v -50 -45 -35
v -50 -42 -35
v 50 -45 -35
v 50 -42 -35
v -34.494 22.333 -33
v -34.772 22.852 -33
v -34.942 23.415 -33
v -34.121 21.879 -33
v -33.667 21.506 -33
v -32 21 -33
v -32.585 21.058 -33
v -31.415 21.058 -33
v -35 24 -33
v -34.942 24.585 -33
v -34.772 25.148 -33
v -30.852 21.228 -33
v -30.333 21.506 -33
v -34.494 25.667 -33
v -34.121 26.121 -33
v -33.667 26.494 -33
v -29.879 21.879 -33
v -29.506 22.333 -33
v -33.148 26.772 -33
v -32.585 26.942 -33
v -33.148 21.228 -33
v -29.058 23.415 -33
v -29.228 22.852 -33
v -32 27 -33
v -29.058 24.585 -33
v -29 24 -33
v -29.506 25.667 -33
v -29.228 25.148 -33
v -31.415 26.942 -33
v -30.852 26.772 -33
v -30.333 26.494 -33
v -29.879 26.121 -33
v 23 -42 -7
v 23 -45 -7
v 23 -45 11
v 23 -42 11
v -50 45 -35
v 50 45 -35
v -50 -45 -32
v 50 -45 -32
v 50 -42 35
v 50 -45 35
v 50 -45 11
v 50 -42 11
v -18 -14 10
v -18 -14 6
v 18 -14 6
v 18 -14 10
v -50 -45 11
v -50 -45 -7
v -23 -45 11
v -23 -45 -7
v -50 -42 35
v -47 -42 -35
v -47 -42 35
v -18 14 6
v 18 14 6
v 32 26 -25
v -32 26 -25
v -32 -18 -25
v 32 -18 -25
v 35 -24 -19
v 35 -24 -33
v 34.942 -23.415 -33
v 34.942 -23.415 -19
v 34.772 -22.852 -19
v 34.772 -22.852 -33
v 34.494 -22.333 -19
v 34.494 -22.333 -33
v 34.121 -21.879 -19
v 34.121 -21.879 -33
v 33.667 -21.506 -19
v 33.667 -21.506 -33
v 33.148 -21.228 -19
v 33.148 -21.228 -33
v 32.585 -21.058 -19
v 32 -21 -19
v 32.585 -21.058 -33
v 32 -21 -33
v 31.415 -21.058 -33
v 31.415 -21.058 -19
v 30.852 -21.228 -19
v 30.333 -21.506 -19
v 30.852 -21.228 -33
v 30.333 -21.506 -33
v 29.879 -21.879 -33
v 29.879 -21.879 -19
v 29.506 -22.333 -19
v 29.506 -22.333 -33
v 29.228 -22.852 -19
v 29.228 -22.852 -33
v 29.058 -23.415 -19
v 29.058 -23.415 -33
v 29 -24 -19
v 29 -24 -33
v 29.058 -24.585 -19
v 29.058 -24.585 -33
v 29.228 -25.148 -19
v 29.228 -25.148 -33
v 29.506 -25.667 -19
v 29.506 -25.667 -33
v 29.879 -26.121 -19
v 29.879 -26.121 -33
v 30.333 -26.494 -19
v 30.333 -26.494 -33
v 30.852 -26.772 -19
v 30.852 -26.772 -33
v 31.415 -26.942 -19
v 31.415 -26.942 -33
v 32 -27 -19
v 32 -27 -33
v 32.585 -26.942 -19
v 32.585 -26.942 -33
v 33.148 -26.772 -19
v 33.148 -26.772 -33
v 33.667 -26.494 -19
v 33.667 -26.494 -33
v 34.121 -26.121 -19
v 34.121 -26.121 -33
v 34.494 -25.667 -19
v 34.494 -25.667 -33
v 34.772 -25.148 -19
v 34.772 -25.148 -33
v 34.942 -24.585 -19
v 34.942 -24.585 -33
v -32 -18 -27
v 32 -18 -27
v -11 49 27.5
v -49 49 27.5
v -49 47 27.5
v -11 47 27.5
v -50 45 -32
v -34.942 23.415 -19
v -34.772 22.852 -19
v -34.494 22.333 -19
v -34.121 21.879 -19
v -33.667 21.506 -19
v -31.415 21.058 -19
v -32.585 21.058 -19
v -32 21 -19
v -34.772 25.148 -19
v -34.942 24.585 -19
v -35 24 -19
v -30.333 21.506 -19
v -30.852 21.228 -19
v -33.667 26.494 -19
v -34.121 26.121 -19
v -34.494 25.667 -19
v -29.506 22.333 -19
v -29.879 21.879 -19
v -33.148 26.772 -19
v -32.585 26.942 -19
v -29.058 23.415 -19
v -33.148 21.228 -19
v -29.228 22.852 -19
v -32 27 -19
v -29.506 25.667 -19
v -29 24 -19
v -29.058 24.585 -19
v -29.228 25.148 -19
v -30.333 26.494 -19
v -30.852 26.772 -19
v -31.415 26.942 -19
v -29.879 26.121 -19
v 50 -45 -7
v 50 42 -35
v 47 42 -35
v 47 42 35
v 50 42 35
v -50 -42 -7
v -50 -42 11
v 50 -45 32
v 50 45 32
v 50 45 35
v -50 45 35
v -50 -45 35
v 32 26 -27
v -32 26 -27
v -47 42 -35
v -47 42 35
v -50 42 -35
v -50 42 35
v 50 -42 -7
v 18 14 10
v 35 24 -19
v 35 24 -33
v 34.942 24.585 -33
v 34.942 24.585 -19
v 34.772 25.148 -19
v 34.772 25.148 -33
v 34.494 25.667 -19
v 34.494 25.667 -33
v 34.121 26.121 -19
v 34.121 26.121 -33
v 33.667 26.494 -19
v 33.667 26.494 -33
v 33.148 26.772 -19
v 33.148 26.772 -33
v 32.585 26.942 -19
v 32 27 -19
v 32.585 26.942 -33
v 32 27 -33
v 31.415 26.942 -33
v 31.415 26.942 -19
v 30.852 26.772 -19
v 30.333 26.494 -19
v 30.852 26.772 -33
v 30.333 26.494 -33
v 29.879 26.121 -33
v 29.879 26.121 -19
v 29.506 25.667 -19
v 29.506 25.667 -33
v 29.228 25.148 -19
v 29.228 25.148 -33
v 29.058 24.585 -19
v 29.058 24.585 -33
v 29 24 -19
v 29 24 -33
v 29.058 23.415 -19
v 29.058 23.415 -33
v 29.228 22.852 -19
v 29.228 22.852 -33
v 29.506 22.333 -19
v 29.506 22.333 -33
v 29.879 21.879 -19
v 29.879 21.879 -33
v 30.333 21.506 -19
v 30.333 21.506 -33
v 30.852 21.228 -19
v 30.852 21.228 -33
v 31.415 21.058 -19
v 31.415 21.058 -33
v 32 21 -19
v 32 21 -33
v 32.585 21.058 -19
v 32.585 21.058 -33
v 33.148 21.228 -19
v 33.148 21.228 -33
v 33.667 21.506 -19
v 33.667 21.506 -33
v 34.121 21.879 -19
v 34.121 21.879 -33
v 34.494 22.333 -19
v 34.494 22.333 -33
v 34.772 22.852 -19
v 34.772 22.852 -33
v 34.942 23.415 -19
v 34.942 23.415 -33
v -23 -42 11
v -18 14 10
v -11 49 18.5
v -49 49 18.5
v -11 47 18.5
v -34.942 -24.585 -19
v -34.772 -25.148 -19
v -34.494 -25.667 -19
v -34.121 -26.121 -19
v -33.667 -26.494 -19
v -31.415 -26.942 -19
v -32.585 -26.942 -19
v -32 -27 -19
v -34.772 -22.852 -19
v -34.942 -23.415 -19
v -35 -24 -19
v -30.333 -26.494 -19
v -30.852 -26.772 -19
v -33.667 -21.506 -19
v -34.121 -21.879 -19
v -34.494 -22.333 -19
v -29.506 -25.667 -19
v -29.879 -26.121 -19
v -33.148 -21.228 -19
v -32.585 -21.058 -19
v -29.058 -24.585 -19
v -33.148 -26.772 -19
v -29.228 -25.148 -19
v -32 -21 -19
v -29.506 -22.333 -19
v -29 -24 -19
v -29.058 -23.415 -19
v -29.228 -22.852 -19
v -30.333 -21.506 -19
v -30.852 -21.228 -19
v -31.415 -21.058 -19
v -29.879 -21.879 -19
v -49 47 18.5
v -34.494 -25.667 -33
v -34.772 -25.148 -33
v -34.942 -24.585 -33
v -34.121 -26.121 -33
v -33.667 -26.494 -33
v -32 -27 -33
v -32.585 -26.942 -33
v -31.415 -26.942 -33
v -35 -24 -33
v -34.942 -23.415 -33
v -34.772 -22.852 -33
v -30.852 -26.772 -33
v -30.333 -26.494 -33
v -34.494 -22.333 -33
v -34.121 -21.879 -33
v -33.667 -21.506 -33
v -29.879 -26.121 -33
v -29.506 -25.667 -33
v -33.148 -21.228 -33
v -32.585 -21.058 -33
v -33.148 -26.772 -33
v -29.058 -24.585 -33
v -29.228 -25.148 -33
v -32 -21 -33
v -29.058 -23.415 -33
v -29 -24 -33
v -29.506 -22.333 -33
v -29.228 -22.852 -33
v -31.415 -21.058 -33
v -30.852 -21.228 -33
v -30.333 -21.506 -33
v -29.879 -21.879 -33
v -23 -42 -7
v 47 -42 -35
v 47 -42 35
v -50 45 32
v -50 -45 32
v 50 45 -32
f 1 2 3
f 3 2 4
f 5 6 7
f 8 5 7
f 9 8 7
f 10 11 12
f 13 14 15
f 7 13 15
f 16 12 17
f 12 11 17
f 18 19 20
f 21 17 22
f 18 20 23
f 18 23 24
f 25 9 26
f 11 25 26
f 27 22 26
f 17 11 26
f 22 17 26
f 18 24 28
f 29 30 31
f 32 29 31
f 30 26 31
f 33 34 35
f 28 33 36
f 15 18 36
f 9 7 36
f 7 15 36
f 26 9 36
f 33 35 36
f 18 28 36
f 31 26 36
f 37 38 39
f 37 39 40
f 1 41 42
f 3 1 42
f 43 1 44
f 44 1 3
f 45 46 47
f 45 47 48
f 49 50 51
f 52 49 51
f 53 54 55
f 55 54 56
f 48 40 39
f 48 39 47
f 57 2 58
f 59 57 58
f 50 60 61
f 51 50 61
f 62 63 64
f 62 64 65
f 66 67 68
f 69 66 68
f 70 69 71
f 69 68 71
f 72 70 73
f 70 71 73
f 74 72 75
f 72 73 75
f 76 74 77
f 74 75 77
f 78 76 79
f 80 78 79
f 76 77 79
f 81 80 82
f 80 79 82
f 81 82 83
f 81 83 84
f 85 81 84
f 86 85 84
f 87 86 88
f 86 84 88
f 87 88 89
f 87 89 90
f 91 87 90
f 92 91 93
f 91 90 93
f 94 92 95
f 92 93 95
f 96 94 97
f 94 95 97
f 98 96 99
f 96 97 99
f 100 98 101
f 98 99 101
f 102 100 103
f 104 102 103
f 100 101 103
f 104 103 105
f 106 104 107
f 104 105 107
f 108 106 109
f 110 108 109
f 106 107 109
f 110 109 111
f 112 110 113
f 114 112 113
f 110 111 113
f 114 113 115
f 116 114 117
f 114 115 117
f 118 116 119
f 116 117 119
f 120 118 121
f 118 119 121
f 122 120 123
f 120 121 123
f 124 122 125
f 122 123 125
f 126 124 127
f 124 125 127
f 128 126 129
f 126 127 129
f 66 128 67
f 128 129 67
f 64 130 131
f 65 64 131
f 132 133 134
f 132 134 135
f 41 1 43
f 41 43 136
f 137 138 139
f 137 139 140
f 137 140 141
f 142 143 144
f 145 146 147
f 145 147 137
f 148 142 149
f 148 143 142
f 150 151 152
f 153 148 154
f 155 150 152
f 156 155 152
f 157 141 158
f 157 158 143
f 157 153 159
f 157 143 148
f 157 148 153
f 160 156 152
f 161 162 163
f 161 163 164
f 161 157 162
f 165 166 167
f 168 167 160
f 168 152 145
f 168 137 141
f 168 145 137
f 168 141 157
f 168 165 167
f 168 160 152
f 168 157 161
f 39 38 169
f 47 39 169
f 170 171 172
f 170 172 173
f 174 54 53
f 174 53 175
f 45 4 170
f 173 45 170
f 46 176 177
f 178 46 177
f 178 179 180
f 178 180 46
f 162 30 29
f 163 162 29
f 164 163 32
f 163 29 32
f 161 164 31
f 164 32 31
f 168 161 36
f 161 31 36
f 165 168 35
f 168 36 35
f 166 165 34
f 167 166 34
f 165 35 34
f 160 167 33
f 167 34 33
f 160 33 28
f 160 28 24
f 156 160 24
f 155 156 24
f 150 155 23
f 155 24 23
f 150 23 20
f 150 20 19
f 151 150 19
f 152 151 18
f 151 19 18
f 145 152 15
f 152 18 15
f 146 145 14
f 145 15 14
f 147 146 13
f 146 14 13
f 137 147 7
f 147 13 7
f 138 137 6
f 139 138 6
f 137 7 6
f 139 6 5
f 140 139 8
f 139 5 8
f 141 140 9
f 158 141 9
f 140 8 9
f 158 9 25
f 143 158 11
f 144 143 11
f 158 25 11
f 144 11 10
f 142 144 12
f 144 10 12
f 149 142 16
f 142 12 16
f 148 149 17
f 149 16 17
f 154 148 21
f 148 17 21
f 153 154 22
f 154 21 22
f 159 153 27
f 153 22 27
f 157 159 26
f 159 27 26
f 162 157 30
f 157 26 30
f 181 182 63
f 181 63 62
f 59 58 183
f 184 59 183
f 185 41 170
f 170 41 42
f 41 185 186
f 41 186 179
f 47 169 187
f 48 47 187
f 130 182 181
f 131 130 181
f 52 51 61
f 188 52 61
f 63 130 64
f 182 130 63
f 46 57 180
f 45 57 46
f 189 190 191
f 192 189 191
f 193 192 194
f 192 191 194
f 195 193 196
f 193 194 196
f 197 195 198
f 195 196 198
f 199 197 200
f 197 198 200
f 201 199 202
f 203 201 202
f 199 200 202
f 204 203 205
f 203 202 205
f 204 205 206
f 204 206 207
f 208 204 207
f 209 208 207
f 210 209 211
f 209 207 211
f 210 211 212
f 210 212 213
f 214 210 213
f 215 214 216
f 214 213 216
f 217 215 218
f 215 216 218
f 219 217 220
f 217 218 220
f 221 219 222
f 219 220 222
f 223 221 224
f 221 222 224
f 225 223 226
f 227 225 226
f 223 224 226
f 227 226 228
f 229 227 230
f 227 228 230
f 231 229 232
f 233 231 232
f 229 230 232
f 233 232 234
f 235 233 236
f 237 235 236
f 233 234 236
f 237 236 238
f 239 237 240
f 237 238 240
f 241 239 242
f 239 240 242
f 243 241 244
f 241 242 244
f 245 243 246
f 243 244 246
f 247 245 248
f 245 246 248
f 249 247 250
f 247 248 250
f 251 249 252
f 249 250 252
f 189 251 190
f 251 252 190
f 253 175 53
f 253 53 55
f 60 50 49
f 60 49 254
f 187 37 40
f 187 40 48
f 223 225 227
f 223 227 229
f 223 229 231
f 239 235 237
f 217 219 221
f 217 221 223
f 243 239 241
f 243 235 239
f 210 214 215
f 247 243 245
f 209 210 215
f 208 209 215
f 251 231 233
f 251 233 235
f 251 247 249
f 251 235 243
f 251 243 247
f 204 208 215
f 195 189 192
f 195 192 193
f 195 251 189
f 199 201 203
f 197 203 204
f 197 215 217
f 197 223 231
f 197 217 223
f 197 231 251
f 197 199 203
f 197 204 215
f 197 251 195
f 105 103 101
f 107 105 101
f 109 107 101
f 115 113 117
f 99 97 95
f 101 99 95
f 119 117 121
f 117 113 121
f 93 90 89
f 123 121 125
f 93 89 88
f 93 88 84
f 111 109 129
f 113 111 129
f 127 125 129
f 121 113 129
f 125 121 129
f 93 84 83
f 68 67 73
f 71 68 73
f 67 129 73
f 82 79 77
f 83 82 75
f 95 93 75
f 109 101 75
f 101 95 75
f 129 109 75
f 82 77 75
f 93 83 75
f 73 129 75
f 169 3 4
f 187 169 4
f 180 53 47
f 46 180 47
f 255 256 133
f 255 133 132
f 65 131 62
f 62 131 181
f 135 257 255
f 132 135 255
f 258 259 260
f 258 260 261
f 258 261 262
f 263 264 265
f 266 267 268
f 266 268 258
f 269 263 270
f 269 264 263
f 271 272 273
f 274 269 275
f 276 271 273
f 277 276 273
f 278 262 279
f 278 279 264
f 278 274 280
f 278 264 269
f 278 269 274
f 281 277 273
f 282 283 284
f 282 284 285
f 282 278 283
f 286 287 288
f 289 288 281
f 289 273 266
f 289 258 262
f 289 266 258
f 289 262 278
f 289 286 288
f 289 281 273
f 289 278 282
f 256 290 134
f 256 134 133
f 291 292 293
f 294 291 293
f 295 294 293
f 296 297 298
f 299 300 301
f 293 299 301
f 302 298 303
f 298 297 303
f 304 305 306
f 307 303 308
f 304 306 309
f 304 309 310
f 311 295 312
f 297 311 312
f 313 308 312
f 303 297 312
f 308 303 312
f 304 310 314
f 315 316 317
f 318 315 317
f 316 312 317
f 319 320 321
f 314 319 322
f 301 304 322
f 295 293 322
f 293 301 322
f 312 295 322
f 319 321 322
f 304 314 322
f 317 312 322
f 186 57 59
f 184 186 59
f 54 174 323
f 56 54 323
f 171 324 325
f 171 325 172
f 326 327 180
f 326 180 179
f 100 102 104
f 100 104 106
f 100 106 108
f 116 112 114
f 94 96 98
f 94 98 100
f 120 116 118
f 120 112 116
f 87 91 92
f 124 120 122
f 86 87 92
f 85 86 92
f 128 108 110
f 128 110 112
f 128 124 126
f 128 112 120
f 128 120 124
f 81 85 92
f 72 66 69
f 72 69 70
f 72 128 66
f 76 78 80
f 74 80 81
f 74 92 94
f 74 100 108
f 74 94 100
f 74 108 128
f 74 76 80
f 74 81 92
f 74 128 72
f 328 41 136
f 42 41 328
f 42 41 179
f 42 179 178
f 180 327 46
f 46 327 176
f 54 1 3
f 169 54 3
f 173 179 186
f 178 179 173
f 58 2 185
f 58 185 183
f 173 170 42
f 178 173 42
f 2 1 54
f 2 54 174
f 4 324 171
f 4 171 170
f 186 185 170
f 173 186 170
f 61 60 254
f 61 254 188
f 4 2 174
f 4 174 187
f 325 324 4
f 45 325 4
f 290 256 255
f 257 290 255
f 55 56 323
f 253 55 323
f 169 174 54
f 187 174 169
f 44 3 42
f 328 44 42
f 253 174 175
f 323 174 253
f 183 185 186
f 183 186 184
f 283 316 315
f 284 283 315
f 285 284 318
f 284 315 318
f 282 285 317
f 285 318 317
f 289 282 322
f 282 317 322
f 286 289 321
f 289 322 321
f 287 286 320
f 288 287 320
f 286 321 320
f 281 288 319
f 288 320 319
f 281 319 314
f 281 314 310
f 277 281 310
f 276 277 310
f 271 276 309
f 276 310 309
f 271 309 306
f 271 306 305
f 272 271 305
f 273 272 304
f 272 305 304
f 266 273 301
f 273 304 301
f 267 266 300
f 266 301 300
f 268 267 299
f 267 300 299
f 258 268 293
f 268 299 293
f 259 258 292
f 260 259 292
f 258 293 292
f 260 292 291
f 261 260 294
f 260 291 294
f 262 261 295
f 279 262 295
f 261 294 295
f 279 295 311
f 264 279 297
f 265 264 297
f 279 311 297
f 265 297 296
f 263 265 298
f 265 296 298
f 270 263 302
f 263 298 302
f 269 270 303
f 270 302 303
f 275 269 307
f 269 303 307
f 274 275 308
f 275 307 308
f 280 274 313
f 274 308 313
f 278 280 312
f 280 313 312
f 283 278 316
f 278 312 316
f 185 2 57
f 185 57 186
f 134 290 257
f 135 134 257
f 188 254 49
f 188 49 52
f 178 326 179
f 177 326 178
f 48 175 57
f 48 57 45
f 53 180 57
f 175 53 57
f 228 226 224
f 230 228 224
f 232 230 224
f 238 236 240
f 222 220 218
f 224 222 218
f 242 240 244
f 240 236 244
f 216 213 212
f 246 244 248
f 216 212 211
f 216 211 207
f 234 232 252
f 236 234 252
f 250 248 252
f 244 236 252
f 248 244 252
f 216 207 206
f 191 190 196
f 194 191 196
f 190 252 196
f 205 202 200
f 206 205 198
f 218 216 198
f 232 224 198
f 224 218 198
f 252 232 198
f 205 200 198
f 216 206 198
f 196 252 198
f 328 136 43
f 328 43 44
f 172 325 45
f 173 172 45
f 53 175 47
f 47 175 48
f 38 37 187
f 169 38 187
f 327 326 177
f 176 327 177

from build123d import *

# Parameters (mm, degrees)
BOTTOM_START                                   = -35
SKETCH_1_W                                     = 100
SKETCH_1_H                                     = 90
BOTTOM_PLATE_100_X_90_X_3_MM_DEPTH             = 3
BACK_START                                     = -35
SKETCH_2_W                                     = 100
SKETCH_2_H                                     = 3
BACK_WALL_3_MM_DEPTH                           = 70
LEFT_START                                     = -35
SKETCH_3_W                                     = 3
SKETCH_3_H                                     = 84
LEFT_SIDE_WALL_3_MM_DEPTH                      = 70
RIGHT_START                                    = -35
SKETCH_4_W                                     = 3
SKETCH_4_H                                     = 84
RIGHT_SIDE_WALL_3_MM_DEPTH                     = 70
FRONT_START                                    = -35
SKETCH_5_W                                     = 100
SKETCH_5_H                                     = 3
FRONT_WALL_LOWER_FRAME_BELOW_HC_SR04_WIN_DEPTH = 28
FRONT_START_2                                  = 11
SKETCH_6_W                                     = 100
SKETCH_6_H                                     = 3
FRONT_WALL_UPPER_FRAME_ABOVE_HC_SR04_WIN_DEPTH = 24
FRONT_START_3                                  = -7
SKETCH_7_W                                     = 27
SKETCH_7_H                                     = 3
FRONT_WALL_LEFT_FRAME_DEPTH                    = 18
SKETCH_8_W                                     = 27
SKETCH_8_H                                     = 3
FRONT_WALL_RIGHT_FRAME_DEPTH                   = 18
TRANSPARENT_START                              = 32
SKETCH_9_W                                     = 100
SKETCH_9_H                                     = 90
TRANSPARENT_TOP_LID_REMOVABLE_DEPTH            = 3
SERVO_START                                    = 6
SKETCH_10_W                                    = 36
SKETCH_10_H                                    = 28
SERVO_SUPPORT_PLATFORM_36_X_28_X_4_MM_DEPTH    = 4
BATTERY_START                                  = -27
SKETCH_11_W                                    = 64
SKETCH_11_H                                    = 44
BATTERY_TRAY_BASE_60_X_40_MM_DEPTH             = 2
PCB_START                                      = -33
SKETCH_12_R                                    = 3
PCB_STANDOFF_1_M3_CLEARANCE_MARKER_DEPTH       = 14
SKETCH_13_R                                    = 3
PCB_STANDOFF_2_M3_CLEARANCE_MARKER_DEPTH       = 14
SKETCH_14_R                                    = 3
PCB_STANDOFF_3_M3_CLEARANCE_MARKER_DEPTH       = 14
SKETCH_15_R                                    = 3
PCB_STANDOFF_4_M3_CLEARANCE_MARKER_DEPTH       = 14
CASE_START                                     = 18.5
SKETCH_16_W                                    = 38
SKETCH_16_H                                    = 2
CASE_LABEL_PLATE_CASE_100X90X70_DEPTH          = 9


with BuildPart() as part:
    # 草图1 → bottom plate - 100 x 90 x 3 mm (new body)
    with BuildSketch(Plane.XY.offset(BOTTOM_START)):
        Rectangle(SKETCH_1_W, SKETCH_1_H)
    extrude(amount=BOTTOM_PLATE_100_X_90_X_3_MM_DEPTH)


with BuildPart() as body_2:
    # 草图2 → back wall - 3 mm (new body)
    with BuildSketch(Plane.XY.offset(BACK_START)):
        with Locations((0, 43.5)):
            Rectangle(SKETCH_2_W, SKETCH_2_H)
    extrude(amount=BACK_WALL_3_MM_DEPTH)


with BuildPart() as body_3:
    # 草图3 → left side wall - 3 mm (new body)
    with BuildSketch(Plane.XY.offset(LEFT_START)):
        with Locations((-48.5, 0)):
            Rectangle(SKETCH_3_W, SKETCH_3_H)
    extrude(amount=LEFT_SIDE_WALL_3_MM_DEPTH)


with BuildPart() as body_4:
    # 草图4 → right side wall - 3 mm (new body)
    with BuildSketch(Plane.XY.offset(RIGHT_START)):
        with Locations((48.5, 0)):
            Rectangle(SKETCH_4_W, SKETCH_4_H)
    extrude(amount=RIGHT_SIDE_WALL_3_MM_DEPTH)


with BuildPart() as body_5:
    # 草图5 → front wall lower frame below HC-SR04 window (new body)
    with BuildSketch(Plane.XY.offset(FRONT_START)):
        with Locations((0, -43.5)):
            Rectangle(SKETCH_5_W, SKETCH_5_H)
    extrude(amount=FRONT_WALL_LOWER_FRAME_BELOW_HC_SR04_WIN_DEPTH)


with BuildPart() as body_6:
    # 草图6 → front wall upper frame above HC-SR04 window (new body)
    with BuildSketch(Plane.XY.offset(FRONT_START_2)):
        with Locations((0, -43.5)):
            Rectangle(SKETCH_6_W, SKETCH_6_H)
    extrude(amount=FRONT_WALL_UPPER_FRAME_ABOVE_HC_SR04_WIN_DEPTH)


with BuildPart() as body_7:
    # 草图7 → front wall left frame (new body)
    with BuildSketch(Plane.XY.offset(FRONT_START_3)):
        with Locations((-36.5, -43.5)):
            Rectangle(SKETCH_7_W, SKETCH_7_H)
    extrude(amount=FRONT_WALL_LEFT_FRAME_DEPTH)


with BuildPart() as body_8:
    # 草图8 → front wall right frame (new body)
    with BuildSketch(Plane.XY.offset(FRONT_START_3)):
        with Locations((36.5, -43.5)):
            Rectangle(SKETCH_8_W, SKETCH_8_H)
    extrude(amount=FRONT_WALL_RIGHT_FRAME_DEPTH)


with BuildPart() as body_9:
    # 草图9 → transparent top lid - removable (new body)
    with BuildSketch(Plane.XY.offset(TRANSPARENT_START)):
        Rectangle(SKETCH_9_W, SKETCH_9_H)
    extrude(amount=TRANSPARENT_TOP_LID_REMOVABLE_DEPTH)


with BuildPart() as body_10:
    # 草图10 → servo support platform - 36 x 28 x 4 mm (new body)
    with BuildSketch(Plane.XY.offset(SERVO_START)):
        Rectangle(SKETCH_10_W, SKETCH_10_H)
    extrude(amount=SERVO_SUPPORT_PLATFORM_36_X_28_X_4_MM_DEPTH)


with BuildPart() as body_11:
    # 草图11 → battery tray base - 60 x 40 mm (new body)
    with BuildSketch(Plane.XY.offset(BATTERY_START)):
        with Locations((0, 4)):
            Rectangle(SKETCH_11_W, SKETCH_11_H)
    extrude(amount=BATTERY_TRAY_BASE_60_X_40_MM_DEPTH)


with BuildPart() as body_12:
    # 草图12 → PCB standoff 1 - M3 clearance marker (new body)
    with BuildSketch(Plane.XY.offset(PCB_START)):
        with Locations((-32, -24)):
            Circle(SKETCH_12_R)
    extrude(amount=PCB_STANDOFF_1_M3_CLEARANCE_MARKER_DEPTH)


with BuildPart() as body_13:
    # 草图13 → PCB standoff 2 - M3 clearance marker (new body)
    with BuildSketch(Plane.XY.offset(PCB_START)):
        with Locations((32, -24)):
            Circle(SKETCH_13_R)
    extrude(amount=PCB_STANDOFF_2_M3_CLEARANCE_MARKER_DEPTH)


with BuildPart() as body_14:
    # 草图14 → PCB standoff 3 - M3 clearance marker (new body)
    with BuildSketch(Plane.XY.offset(PCB_START)):
        with Locations((-32, 24)):
            Circle(SKETCH_14_R)
    extrude(amount=PCB_STANDOFF_3_M3_CLEARANCE_MARKER_DEPTH)


with BuildPart() as body_15:
    # 草图15 → PCB standoff 4 - M3 clearance marker (new body)
    with BuildSketch(Plane.XY.offset(PCB_START)):
        with Locations((32, 24)):
            Circle(SKETCH_15_R)
    extrude(amount=PCB_STANDOFF_4_M3_CLEARANCE_MARKER_DEPTH)


with BuildPart() as body_16:
    # 草图16 → case label plate - CASE 100x90x70 (new body)
    with BuildSketch(Plane.XY.offset(CASE_START)):
        with Locations((-30, 48)):
            Rectangle(SKETCH_16_W, SKETCH_16_H)
    extrude(amount=CASE_LABEL_PLATE_CASE_100X90X70_DEPTH)


solid = Compound([part.part, body_2.part, body_3.part, body_4.part, body_5.part, body_6.part, body_7.part, body_8.part, body_9.part, body_10.part, body_11.part, body_12.part, body_13.part, body_14.part, body_15.part, body_16.part])
